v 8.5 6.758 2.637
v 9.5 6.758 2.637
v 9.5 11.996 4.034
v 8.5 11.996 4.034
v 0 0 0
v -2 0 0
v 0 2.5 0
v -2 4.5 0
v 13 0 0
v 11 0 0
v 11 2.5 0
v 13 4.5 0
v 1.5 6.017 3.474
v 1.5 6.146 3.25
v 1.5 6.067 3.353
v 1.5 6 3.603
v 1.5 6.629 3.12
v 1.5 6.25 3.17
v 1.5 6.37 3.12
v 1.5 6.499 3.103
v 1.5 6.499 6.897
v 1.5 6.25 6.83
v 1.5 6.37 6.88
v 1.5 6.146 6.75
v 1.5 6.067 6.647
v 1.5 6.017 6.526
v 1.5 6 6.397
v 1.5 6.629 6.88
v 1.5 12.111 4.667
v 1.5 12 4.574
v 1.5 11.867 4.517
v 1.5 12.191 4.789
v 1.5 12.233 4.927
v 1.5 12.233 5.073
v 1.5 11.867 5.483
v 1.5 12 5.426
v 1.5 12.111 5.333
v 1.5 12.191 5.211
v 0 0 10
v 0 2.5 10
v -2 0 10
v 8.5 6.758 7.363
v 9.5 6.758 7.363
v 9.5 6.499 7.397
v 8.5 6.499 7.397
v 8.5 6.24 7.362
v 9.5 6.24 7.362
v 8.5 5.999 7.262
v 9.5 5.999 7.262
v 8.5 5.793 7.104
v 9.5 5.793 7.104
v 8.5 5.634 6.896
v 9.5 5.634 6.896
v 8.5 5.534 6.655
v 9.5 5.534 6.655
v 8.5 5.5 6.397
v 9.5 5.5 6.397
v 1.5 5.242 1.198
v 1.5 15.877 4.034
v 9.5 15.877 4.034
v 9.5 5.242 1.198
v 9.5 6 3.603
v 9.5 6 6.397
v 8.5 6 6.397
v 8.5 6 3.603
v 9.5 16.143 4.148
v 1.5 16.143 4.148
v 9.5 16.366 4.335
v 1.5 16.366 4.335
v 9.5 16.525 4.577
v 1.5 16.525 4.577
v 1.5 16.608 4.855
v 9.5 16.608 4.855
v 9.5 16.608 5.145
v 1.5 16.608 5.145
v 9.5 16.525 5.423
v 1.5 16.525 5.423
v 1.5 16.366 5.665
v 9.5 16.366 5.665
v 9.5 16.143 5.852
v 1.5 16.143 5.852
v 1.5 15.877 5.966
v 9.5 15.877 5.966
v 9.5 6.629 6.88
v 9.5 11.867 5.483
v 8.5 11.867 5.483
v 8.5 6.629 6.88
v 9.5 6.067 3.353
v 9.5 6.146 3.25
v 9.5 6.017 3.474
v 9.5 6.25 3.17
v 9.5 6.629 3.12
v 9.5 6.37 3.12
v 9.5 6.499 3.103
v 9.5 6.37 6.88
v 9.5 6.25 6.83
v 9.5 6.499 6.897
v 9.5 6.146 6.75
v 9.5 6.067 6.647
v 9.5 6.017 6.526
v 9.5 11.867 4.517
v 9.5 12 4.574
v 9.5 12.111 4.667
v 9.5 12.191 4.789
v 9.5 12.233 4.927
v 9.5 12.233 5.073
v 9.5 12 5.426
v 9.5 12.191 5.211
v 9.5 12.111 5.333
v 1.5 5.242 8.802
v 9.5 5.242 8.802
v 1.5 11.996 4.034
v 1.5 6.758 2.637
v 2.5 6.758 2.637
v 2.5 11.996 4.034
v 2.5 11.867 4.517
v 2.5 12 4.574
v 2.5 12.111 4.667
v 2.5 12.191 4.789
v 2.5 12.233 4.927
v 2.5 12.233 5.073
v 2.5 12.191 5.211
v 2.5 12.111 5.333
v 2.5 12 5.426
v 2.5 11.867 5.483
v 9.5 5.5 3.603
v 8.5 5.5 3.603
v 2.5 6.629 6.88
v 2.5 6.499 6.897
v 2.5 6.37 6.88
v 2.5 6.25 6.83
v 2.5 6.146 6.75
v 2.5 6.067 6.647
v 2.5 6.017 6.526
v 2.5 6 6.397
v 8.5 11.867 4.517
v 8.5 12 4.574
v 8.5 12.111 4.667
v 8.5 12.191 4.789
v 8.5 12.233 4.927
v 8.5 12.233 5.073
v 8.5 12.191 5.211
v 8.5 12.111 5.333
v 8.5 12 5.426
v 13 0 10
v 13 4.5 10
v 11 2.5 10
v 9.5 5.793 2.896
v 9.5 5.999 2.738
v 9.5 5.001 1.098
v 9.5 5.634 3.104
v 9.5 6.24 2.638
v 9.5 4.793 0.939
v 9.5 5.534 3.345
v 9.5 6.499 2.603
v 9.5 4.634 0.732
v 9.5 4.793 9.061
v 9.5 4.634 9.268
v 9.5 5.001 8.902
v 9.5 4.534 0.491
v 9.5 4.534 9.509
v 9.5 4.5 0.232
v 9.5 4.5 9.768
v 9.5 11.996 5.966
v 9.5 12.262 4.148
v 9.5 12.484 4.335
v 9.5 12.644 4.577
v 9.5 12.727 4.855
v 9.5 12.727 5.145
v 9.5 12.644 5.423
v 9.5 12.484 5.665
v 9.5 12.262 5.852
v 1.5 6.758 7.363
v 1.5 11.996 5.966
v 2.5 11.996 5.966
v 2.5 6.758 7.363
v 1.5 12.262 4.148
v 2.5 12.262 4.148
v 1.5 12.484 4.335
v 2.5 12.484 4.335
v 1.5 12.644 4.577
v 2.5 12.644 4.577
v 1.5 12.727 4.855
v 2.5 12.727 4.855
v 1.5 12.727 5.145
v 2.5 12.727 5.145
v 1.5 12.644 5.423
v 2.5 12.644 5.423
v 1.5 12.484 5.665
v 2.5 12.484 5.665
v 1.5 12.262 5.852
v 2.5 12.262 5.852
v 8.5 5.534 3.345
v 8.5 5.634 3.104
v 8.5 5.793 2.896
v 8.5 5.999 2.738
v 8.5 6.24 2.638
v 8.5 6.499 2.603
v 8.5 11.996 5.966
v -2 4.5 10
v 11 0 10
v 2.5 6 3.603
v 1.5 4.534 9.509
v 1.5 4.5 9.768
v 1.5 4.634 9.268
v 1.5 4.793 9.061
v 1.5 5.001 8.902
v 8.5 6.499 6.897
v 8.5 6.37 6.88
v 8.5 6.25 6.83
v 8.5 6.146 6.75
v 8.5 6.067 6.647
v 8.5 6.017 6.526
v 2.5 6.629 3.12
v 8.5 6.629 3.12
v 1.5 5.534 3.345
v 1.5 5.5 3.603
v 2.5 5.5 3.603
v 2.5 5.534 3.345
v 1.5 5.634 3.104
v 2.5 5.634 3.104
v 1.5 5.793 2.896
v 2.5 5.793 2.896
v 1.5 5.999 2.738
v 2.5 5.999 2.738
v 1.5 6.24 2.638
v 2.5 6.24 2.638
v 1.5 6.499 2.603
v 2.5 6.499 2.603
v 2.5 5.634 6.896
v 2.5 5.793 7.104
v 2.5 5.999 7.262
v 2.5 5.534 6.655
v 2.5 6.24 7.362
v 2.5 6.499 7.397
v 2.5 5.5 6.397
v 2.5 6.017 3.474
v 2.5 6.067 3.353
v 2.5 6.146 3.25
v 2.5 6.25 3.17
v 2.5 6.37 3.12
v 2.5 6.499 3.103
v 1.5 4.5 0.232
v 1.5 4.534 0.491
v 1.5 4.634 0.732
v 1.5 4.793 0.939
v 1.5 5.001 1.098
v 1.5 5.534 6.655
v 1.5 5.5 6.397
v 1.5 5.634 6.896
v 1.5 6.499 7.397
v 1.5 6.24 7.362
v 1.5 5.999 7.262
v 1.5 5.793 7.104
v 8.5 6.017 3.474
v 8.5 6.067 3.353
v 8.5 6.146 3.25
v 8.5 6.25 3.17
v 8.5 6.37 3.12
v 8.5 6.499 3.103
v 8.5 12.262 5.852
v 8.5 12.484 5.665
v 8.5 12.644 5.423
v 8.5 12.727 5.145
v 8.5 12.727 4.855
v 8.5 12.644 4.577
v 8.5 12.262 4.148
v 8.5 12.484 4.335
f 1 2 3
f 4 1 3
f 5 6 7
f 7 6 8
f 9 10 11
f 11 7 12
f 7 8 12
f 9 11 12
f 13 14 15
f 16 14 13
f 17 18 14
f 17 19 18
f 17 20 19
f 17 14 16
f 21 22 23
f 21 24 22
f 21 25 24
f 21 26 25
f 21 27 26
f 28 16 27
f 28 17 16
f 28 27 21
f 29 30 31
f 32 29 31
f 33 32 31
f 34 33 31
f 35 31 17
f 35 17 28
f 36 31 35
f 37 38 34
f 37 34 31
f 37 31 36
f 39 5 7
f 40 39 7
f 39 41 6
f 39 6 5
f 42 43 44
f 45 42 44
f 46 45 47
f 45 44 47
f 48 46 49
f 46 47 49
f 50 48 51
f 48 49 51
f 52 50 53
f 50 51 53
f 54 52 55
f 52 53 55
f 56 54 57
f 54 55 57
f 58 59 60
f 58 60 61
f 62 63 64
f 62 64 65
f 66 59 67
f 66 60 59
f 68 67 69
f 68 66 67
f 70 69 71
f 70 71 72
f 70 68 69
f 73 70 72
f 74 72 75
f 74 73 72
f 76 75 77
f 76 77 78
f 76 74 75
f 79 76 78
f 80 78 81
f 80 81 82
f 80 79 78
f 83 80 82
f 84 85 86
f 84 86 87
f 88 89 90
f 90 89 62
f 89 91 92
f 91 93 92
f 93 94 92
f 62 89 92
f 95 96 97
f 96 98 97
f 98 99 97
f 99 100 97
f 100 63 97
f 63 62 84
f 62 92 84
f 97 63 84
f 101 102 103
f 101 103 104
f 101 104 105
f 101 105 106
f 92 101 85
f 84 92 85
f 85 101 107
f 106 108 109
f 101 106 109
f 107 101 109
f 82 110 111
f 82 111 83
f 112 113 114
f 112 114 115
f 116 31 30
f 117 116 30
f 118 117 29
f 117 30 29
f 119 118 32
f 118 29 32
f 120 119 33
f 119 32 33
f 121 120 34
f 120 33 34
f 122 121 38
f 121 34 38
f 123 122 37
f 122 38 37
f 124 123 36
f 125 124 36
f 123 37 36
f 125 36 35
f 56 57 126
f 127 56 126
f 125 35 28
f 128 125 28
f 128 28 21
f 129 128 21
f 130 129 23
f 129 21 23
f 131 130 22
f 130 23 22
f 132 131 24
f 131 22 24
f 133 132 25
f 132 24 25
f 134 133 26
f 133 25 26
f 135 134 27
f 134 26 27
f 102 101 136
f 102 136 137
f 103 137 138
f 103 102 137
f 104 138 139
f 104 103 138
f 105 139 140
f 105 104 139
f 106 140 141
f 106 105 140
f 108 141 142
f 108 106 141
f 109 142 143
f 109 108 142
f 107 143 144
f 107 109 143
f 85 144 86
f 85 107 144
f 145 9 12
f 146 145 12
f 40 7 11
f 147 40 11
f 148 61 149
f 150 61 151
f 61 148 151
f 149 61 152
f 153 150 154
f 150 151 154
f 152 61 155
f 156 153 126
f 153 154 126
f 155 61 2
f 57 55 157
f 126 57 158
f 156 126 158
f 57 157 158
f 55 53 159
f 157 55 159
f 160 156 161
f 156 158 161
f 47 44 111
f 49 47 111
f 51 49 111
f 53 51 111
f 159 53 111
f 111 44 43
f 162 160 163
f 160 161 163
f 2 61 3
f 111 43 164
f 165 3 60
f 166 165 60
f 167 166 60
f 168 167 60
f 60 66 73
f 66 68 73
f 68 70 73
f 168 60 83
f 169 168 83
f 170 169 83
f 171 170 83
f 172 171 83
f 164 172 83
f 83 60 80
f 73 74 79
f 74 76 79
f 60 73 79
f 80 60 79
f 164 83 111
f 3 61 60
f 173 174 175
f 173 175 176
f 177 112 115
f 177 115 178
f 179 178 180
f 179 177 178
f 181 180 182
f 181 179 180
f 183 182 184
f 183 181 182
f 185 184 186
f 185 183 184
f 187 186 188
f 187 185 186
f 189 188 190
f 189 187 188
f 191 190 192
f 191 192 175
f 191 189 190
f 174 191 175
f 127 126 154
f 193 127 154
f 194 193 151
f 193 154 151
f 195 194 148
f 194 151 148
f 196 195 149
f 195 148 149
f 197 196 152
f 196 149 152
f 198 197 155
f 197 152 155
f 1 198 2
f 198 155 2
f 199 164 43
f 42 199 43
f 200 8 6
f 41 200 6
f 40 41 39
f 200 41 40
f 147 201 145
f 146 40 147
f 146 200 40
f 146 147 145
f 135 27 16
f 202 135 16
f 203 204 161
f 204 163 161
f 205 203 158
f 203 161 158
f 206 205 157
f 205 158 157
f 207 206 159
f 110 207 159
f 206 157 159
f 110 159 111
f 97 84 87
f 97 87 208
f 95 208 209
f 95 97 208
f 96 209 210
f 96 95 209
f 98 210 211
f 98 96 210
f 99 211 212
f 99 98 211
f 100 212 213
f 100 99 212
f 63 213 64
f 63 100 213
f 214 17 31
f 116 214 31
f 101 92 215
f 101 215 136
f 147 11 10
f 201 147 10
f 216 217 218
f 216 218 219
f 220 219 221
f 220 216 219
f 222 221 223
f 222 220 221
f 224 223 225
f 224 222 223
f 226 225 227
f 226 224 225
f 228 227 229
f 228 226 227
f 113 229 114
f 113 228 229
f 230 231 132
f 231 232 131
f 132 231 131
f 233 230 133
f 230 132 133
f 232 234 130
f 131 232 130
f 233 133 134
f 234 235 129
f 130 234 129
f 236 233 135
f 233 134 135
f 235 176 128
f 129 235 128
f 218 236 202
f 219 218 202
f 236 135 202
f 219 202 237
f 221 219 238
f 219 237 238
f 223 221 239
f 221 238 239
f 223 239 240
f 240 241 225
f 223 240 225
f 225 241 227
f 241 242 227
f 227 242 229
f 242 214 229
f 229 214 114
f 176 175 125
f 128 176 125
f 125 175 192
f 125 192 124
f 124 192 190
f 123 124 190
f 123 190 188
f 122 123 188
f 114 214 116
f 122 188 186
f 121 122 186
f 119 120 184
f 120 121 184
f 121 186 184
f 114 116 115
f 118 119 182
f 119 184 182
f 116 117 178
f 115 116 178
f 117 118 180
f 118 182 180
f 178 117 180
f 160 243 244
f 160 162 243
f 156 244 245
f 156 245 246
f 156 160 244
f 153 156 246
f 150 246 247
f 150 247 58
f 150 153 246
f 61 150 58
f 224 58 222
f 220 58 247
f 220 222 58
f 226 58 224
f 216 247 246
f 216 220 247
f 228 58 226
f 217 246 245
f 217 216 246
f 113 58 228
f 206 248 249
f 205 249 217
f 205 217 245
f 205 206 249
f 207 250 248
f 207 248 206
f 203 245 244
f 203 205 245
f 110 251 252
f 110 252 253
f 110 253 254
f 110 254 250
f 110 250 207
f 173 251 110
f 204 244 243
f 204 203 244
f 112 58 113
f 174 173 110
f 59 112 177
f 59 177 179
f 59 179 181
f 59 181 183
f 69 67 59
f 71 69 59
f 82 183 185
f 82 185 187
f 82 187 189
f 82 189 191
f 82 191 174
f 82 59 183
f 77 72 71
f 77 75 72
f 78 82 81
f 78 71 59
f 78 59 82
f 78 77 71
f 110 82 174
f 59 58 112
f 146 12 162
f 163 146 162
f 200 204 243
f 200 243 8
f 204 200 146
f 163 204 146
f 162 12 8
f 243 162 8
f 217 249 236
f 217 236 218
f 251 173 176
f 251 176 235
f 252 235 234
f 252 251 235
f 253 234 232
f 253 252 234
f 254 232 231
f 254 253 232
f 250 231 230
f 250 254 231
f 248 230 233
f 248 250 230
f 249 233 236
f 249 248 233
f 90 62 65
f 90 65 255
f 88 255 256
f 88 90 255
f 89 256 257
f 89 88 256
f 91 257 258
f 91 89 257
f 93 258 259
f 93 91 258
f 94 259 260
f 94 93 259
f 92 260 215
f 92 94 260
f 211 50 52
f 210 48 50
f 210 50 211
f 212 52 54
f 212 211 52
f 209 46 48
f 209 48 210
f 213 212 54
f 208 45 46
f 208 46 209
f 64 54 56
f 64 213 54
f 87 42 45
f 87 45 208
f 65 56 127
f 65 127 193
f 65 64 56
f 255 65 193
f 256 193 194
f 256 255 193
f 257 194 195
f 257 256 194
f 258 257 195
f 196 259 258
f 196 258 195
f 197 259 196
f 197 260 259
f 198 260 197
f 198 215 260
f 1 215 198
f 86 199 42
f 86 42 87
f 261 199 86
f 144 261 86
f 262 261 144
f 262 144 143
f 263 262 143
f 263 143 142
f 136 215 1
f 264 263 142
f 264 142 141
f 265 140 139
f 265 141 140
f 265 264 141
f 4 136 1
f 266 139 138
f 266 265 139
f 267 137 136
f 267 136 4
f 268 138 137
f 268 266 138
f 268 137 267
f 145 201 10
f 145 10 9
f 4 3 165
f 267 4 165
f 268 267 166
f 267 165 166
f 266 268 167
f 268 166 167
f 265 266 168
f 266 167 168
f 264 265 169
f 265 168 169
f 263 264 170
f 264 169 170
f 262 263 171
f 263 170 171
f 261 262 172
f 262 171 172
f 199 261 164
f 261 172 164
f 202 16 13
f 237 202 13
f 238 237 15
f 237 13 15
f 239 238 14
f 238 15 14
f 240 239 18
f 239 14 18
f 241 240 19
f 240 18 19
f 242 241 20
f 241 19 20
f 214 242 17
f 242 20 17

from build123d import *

# Parameters (mm, degrees)
EXTRUDE_1_DEPTH      = 10
EXTRUDE_3_DEPTH      = 4
EXTRUDE_3_DEPTH_BACK = 4
FILLET_3_R           = 1
CUT_EXTRUDE_2_DEPTH  = 1


with BuildPart() as part:
    # 草图1 → 凸台-拉伸1 (new body)
    with BuildSketch(Plane.XY):
        Polygon((0, 0), (0, 2.5), (11, 2.5), (11, 0), (13, 0), (13, 4.5), (-2, 4.5), (-2, 0), align=None)
    extrude(amount=EXTRUDE_1_DEPTH)

    # 草图7 → 凸台-拉伸3 (add, two sides: drawn at the far end of the back side and taken through both)
    with BuildSketch(Plane(origin=(5.5, 0, 0), x_dir=(0, 0, -1), z_dir=(1, 0, 0)).offset(-EXTRUDE_3_DEPTH_BACK)):
        Polygon((-9, 4.5), (-5, 19.5), (-1, 4.5), align=None)
    extrude(amount=EXTRUDE_3_DEPTH + EXTRUDE_3_DEPTH_BACK)

    # 圆角3
    fillet_3_edges = [part.edges().sort_by_distance(p)[0] for p in [
        (5.5, 4.5, 1),
        (5.5, 4.5, 9),
        (5.5, 19.5, 5),
    ]]
    fillet(fillet_3_edges, radius=FILLET_3_R)

    # 草图8 → 切除-拉伸2 (cut)
    with BuildSketch(Plane(origin=(9.5, 0, 0), x_dir=(0, 0, -1), z_dir=(1, 0, 0))):
        with BuildLine():
            Line((-2.636988353, 6.757662651), (-4.03376506, 11.995575302))
            ThreePointArc((-4.03376506, 11.995575302), (-5, 12.737912652), (-5.96623494, 11.995575302))
            Line((-5.96623494, 11.995575302), (-7.363011647, 6.757662651))
            ThreePointArc((-7.363011647, 6.757662651), (-7.189765563, 5.89076386), (-6.396776707, 5.5))
            Line((-6.396776707, 5.5), (-3.603223293, 5.5))
            ThreePointArc((-3.603223293, 5.5), (-2.810234437, 5.89076386), (-2.636988353, 6.757662651))
        make_face()
        with BuildLine():
            ThreePointArc((-6.879894177, 6.628831325), (-6.793271135, 6.19538193), (-6.396776707, 6))
            Line((-6.396776707, 6), (-3.603223293, 6))
            ThreePointArc((-3.603223293, 6), (-3.206728865, 6.19538193), (-3.120105823, 6.628831325))
            Line((-3.120105823, 6.628831325), (-4.51688253, 11.866743977))
            ThreePointArc((-4.51688253, 11.866743977), (-5, 12.237912652), (-5.48311747, 11.866743977))
            Line((-5.48311747, 11.866743977), (-6.879894177, 6.628831325))
        make_face(mode=Mode.SUBTRACT)
    cut_extrude_2 = extrude(amount=-CUT_EXTRUDE_2_DEPTH, mode=Mode.SUBTRACT)

    # 镜向1: 切除-拉伸2 across plane
    add(cut_extrude_2.mirror(Plane(origin=(5.5, 0, 0), x_dir=(0, 0, 1), z_dir=(1, 0, 0))), mode=Mode.SUBTRACT)


solid = part.part
